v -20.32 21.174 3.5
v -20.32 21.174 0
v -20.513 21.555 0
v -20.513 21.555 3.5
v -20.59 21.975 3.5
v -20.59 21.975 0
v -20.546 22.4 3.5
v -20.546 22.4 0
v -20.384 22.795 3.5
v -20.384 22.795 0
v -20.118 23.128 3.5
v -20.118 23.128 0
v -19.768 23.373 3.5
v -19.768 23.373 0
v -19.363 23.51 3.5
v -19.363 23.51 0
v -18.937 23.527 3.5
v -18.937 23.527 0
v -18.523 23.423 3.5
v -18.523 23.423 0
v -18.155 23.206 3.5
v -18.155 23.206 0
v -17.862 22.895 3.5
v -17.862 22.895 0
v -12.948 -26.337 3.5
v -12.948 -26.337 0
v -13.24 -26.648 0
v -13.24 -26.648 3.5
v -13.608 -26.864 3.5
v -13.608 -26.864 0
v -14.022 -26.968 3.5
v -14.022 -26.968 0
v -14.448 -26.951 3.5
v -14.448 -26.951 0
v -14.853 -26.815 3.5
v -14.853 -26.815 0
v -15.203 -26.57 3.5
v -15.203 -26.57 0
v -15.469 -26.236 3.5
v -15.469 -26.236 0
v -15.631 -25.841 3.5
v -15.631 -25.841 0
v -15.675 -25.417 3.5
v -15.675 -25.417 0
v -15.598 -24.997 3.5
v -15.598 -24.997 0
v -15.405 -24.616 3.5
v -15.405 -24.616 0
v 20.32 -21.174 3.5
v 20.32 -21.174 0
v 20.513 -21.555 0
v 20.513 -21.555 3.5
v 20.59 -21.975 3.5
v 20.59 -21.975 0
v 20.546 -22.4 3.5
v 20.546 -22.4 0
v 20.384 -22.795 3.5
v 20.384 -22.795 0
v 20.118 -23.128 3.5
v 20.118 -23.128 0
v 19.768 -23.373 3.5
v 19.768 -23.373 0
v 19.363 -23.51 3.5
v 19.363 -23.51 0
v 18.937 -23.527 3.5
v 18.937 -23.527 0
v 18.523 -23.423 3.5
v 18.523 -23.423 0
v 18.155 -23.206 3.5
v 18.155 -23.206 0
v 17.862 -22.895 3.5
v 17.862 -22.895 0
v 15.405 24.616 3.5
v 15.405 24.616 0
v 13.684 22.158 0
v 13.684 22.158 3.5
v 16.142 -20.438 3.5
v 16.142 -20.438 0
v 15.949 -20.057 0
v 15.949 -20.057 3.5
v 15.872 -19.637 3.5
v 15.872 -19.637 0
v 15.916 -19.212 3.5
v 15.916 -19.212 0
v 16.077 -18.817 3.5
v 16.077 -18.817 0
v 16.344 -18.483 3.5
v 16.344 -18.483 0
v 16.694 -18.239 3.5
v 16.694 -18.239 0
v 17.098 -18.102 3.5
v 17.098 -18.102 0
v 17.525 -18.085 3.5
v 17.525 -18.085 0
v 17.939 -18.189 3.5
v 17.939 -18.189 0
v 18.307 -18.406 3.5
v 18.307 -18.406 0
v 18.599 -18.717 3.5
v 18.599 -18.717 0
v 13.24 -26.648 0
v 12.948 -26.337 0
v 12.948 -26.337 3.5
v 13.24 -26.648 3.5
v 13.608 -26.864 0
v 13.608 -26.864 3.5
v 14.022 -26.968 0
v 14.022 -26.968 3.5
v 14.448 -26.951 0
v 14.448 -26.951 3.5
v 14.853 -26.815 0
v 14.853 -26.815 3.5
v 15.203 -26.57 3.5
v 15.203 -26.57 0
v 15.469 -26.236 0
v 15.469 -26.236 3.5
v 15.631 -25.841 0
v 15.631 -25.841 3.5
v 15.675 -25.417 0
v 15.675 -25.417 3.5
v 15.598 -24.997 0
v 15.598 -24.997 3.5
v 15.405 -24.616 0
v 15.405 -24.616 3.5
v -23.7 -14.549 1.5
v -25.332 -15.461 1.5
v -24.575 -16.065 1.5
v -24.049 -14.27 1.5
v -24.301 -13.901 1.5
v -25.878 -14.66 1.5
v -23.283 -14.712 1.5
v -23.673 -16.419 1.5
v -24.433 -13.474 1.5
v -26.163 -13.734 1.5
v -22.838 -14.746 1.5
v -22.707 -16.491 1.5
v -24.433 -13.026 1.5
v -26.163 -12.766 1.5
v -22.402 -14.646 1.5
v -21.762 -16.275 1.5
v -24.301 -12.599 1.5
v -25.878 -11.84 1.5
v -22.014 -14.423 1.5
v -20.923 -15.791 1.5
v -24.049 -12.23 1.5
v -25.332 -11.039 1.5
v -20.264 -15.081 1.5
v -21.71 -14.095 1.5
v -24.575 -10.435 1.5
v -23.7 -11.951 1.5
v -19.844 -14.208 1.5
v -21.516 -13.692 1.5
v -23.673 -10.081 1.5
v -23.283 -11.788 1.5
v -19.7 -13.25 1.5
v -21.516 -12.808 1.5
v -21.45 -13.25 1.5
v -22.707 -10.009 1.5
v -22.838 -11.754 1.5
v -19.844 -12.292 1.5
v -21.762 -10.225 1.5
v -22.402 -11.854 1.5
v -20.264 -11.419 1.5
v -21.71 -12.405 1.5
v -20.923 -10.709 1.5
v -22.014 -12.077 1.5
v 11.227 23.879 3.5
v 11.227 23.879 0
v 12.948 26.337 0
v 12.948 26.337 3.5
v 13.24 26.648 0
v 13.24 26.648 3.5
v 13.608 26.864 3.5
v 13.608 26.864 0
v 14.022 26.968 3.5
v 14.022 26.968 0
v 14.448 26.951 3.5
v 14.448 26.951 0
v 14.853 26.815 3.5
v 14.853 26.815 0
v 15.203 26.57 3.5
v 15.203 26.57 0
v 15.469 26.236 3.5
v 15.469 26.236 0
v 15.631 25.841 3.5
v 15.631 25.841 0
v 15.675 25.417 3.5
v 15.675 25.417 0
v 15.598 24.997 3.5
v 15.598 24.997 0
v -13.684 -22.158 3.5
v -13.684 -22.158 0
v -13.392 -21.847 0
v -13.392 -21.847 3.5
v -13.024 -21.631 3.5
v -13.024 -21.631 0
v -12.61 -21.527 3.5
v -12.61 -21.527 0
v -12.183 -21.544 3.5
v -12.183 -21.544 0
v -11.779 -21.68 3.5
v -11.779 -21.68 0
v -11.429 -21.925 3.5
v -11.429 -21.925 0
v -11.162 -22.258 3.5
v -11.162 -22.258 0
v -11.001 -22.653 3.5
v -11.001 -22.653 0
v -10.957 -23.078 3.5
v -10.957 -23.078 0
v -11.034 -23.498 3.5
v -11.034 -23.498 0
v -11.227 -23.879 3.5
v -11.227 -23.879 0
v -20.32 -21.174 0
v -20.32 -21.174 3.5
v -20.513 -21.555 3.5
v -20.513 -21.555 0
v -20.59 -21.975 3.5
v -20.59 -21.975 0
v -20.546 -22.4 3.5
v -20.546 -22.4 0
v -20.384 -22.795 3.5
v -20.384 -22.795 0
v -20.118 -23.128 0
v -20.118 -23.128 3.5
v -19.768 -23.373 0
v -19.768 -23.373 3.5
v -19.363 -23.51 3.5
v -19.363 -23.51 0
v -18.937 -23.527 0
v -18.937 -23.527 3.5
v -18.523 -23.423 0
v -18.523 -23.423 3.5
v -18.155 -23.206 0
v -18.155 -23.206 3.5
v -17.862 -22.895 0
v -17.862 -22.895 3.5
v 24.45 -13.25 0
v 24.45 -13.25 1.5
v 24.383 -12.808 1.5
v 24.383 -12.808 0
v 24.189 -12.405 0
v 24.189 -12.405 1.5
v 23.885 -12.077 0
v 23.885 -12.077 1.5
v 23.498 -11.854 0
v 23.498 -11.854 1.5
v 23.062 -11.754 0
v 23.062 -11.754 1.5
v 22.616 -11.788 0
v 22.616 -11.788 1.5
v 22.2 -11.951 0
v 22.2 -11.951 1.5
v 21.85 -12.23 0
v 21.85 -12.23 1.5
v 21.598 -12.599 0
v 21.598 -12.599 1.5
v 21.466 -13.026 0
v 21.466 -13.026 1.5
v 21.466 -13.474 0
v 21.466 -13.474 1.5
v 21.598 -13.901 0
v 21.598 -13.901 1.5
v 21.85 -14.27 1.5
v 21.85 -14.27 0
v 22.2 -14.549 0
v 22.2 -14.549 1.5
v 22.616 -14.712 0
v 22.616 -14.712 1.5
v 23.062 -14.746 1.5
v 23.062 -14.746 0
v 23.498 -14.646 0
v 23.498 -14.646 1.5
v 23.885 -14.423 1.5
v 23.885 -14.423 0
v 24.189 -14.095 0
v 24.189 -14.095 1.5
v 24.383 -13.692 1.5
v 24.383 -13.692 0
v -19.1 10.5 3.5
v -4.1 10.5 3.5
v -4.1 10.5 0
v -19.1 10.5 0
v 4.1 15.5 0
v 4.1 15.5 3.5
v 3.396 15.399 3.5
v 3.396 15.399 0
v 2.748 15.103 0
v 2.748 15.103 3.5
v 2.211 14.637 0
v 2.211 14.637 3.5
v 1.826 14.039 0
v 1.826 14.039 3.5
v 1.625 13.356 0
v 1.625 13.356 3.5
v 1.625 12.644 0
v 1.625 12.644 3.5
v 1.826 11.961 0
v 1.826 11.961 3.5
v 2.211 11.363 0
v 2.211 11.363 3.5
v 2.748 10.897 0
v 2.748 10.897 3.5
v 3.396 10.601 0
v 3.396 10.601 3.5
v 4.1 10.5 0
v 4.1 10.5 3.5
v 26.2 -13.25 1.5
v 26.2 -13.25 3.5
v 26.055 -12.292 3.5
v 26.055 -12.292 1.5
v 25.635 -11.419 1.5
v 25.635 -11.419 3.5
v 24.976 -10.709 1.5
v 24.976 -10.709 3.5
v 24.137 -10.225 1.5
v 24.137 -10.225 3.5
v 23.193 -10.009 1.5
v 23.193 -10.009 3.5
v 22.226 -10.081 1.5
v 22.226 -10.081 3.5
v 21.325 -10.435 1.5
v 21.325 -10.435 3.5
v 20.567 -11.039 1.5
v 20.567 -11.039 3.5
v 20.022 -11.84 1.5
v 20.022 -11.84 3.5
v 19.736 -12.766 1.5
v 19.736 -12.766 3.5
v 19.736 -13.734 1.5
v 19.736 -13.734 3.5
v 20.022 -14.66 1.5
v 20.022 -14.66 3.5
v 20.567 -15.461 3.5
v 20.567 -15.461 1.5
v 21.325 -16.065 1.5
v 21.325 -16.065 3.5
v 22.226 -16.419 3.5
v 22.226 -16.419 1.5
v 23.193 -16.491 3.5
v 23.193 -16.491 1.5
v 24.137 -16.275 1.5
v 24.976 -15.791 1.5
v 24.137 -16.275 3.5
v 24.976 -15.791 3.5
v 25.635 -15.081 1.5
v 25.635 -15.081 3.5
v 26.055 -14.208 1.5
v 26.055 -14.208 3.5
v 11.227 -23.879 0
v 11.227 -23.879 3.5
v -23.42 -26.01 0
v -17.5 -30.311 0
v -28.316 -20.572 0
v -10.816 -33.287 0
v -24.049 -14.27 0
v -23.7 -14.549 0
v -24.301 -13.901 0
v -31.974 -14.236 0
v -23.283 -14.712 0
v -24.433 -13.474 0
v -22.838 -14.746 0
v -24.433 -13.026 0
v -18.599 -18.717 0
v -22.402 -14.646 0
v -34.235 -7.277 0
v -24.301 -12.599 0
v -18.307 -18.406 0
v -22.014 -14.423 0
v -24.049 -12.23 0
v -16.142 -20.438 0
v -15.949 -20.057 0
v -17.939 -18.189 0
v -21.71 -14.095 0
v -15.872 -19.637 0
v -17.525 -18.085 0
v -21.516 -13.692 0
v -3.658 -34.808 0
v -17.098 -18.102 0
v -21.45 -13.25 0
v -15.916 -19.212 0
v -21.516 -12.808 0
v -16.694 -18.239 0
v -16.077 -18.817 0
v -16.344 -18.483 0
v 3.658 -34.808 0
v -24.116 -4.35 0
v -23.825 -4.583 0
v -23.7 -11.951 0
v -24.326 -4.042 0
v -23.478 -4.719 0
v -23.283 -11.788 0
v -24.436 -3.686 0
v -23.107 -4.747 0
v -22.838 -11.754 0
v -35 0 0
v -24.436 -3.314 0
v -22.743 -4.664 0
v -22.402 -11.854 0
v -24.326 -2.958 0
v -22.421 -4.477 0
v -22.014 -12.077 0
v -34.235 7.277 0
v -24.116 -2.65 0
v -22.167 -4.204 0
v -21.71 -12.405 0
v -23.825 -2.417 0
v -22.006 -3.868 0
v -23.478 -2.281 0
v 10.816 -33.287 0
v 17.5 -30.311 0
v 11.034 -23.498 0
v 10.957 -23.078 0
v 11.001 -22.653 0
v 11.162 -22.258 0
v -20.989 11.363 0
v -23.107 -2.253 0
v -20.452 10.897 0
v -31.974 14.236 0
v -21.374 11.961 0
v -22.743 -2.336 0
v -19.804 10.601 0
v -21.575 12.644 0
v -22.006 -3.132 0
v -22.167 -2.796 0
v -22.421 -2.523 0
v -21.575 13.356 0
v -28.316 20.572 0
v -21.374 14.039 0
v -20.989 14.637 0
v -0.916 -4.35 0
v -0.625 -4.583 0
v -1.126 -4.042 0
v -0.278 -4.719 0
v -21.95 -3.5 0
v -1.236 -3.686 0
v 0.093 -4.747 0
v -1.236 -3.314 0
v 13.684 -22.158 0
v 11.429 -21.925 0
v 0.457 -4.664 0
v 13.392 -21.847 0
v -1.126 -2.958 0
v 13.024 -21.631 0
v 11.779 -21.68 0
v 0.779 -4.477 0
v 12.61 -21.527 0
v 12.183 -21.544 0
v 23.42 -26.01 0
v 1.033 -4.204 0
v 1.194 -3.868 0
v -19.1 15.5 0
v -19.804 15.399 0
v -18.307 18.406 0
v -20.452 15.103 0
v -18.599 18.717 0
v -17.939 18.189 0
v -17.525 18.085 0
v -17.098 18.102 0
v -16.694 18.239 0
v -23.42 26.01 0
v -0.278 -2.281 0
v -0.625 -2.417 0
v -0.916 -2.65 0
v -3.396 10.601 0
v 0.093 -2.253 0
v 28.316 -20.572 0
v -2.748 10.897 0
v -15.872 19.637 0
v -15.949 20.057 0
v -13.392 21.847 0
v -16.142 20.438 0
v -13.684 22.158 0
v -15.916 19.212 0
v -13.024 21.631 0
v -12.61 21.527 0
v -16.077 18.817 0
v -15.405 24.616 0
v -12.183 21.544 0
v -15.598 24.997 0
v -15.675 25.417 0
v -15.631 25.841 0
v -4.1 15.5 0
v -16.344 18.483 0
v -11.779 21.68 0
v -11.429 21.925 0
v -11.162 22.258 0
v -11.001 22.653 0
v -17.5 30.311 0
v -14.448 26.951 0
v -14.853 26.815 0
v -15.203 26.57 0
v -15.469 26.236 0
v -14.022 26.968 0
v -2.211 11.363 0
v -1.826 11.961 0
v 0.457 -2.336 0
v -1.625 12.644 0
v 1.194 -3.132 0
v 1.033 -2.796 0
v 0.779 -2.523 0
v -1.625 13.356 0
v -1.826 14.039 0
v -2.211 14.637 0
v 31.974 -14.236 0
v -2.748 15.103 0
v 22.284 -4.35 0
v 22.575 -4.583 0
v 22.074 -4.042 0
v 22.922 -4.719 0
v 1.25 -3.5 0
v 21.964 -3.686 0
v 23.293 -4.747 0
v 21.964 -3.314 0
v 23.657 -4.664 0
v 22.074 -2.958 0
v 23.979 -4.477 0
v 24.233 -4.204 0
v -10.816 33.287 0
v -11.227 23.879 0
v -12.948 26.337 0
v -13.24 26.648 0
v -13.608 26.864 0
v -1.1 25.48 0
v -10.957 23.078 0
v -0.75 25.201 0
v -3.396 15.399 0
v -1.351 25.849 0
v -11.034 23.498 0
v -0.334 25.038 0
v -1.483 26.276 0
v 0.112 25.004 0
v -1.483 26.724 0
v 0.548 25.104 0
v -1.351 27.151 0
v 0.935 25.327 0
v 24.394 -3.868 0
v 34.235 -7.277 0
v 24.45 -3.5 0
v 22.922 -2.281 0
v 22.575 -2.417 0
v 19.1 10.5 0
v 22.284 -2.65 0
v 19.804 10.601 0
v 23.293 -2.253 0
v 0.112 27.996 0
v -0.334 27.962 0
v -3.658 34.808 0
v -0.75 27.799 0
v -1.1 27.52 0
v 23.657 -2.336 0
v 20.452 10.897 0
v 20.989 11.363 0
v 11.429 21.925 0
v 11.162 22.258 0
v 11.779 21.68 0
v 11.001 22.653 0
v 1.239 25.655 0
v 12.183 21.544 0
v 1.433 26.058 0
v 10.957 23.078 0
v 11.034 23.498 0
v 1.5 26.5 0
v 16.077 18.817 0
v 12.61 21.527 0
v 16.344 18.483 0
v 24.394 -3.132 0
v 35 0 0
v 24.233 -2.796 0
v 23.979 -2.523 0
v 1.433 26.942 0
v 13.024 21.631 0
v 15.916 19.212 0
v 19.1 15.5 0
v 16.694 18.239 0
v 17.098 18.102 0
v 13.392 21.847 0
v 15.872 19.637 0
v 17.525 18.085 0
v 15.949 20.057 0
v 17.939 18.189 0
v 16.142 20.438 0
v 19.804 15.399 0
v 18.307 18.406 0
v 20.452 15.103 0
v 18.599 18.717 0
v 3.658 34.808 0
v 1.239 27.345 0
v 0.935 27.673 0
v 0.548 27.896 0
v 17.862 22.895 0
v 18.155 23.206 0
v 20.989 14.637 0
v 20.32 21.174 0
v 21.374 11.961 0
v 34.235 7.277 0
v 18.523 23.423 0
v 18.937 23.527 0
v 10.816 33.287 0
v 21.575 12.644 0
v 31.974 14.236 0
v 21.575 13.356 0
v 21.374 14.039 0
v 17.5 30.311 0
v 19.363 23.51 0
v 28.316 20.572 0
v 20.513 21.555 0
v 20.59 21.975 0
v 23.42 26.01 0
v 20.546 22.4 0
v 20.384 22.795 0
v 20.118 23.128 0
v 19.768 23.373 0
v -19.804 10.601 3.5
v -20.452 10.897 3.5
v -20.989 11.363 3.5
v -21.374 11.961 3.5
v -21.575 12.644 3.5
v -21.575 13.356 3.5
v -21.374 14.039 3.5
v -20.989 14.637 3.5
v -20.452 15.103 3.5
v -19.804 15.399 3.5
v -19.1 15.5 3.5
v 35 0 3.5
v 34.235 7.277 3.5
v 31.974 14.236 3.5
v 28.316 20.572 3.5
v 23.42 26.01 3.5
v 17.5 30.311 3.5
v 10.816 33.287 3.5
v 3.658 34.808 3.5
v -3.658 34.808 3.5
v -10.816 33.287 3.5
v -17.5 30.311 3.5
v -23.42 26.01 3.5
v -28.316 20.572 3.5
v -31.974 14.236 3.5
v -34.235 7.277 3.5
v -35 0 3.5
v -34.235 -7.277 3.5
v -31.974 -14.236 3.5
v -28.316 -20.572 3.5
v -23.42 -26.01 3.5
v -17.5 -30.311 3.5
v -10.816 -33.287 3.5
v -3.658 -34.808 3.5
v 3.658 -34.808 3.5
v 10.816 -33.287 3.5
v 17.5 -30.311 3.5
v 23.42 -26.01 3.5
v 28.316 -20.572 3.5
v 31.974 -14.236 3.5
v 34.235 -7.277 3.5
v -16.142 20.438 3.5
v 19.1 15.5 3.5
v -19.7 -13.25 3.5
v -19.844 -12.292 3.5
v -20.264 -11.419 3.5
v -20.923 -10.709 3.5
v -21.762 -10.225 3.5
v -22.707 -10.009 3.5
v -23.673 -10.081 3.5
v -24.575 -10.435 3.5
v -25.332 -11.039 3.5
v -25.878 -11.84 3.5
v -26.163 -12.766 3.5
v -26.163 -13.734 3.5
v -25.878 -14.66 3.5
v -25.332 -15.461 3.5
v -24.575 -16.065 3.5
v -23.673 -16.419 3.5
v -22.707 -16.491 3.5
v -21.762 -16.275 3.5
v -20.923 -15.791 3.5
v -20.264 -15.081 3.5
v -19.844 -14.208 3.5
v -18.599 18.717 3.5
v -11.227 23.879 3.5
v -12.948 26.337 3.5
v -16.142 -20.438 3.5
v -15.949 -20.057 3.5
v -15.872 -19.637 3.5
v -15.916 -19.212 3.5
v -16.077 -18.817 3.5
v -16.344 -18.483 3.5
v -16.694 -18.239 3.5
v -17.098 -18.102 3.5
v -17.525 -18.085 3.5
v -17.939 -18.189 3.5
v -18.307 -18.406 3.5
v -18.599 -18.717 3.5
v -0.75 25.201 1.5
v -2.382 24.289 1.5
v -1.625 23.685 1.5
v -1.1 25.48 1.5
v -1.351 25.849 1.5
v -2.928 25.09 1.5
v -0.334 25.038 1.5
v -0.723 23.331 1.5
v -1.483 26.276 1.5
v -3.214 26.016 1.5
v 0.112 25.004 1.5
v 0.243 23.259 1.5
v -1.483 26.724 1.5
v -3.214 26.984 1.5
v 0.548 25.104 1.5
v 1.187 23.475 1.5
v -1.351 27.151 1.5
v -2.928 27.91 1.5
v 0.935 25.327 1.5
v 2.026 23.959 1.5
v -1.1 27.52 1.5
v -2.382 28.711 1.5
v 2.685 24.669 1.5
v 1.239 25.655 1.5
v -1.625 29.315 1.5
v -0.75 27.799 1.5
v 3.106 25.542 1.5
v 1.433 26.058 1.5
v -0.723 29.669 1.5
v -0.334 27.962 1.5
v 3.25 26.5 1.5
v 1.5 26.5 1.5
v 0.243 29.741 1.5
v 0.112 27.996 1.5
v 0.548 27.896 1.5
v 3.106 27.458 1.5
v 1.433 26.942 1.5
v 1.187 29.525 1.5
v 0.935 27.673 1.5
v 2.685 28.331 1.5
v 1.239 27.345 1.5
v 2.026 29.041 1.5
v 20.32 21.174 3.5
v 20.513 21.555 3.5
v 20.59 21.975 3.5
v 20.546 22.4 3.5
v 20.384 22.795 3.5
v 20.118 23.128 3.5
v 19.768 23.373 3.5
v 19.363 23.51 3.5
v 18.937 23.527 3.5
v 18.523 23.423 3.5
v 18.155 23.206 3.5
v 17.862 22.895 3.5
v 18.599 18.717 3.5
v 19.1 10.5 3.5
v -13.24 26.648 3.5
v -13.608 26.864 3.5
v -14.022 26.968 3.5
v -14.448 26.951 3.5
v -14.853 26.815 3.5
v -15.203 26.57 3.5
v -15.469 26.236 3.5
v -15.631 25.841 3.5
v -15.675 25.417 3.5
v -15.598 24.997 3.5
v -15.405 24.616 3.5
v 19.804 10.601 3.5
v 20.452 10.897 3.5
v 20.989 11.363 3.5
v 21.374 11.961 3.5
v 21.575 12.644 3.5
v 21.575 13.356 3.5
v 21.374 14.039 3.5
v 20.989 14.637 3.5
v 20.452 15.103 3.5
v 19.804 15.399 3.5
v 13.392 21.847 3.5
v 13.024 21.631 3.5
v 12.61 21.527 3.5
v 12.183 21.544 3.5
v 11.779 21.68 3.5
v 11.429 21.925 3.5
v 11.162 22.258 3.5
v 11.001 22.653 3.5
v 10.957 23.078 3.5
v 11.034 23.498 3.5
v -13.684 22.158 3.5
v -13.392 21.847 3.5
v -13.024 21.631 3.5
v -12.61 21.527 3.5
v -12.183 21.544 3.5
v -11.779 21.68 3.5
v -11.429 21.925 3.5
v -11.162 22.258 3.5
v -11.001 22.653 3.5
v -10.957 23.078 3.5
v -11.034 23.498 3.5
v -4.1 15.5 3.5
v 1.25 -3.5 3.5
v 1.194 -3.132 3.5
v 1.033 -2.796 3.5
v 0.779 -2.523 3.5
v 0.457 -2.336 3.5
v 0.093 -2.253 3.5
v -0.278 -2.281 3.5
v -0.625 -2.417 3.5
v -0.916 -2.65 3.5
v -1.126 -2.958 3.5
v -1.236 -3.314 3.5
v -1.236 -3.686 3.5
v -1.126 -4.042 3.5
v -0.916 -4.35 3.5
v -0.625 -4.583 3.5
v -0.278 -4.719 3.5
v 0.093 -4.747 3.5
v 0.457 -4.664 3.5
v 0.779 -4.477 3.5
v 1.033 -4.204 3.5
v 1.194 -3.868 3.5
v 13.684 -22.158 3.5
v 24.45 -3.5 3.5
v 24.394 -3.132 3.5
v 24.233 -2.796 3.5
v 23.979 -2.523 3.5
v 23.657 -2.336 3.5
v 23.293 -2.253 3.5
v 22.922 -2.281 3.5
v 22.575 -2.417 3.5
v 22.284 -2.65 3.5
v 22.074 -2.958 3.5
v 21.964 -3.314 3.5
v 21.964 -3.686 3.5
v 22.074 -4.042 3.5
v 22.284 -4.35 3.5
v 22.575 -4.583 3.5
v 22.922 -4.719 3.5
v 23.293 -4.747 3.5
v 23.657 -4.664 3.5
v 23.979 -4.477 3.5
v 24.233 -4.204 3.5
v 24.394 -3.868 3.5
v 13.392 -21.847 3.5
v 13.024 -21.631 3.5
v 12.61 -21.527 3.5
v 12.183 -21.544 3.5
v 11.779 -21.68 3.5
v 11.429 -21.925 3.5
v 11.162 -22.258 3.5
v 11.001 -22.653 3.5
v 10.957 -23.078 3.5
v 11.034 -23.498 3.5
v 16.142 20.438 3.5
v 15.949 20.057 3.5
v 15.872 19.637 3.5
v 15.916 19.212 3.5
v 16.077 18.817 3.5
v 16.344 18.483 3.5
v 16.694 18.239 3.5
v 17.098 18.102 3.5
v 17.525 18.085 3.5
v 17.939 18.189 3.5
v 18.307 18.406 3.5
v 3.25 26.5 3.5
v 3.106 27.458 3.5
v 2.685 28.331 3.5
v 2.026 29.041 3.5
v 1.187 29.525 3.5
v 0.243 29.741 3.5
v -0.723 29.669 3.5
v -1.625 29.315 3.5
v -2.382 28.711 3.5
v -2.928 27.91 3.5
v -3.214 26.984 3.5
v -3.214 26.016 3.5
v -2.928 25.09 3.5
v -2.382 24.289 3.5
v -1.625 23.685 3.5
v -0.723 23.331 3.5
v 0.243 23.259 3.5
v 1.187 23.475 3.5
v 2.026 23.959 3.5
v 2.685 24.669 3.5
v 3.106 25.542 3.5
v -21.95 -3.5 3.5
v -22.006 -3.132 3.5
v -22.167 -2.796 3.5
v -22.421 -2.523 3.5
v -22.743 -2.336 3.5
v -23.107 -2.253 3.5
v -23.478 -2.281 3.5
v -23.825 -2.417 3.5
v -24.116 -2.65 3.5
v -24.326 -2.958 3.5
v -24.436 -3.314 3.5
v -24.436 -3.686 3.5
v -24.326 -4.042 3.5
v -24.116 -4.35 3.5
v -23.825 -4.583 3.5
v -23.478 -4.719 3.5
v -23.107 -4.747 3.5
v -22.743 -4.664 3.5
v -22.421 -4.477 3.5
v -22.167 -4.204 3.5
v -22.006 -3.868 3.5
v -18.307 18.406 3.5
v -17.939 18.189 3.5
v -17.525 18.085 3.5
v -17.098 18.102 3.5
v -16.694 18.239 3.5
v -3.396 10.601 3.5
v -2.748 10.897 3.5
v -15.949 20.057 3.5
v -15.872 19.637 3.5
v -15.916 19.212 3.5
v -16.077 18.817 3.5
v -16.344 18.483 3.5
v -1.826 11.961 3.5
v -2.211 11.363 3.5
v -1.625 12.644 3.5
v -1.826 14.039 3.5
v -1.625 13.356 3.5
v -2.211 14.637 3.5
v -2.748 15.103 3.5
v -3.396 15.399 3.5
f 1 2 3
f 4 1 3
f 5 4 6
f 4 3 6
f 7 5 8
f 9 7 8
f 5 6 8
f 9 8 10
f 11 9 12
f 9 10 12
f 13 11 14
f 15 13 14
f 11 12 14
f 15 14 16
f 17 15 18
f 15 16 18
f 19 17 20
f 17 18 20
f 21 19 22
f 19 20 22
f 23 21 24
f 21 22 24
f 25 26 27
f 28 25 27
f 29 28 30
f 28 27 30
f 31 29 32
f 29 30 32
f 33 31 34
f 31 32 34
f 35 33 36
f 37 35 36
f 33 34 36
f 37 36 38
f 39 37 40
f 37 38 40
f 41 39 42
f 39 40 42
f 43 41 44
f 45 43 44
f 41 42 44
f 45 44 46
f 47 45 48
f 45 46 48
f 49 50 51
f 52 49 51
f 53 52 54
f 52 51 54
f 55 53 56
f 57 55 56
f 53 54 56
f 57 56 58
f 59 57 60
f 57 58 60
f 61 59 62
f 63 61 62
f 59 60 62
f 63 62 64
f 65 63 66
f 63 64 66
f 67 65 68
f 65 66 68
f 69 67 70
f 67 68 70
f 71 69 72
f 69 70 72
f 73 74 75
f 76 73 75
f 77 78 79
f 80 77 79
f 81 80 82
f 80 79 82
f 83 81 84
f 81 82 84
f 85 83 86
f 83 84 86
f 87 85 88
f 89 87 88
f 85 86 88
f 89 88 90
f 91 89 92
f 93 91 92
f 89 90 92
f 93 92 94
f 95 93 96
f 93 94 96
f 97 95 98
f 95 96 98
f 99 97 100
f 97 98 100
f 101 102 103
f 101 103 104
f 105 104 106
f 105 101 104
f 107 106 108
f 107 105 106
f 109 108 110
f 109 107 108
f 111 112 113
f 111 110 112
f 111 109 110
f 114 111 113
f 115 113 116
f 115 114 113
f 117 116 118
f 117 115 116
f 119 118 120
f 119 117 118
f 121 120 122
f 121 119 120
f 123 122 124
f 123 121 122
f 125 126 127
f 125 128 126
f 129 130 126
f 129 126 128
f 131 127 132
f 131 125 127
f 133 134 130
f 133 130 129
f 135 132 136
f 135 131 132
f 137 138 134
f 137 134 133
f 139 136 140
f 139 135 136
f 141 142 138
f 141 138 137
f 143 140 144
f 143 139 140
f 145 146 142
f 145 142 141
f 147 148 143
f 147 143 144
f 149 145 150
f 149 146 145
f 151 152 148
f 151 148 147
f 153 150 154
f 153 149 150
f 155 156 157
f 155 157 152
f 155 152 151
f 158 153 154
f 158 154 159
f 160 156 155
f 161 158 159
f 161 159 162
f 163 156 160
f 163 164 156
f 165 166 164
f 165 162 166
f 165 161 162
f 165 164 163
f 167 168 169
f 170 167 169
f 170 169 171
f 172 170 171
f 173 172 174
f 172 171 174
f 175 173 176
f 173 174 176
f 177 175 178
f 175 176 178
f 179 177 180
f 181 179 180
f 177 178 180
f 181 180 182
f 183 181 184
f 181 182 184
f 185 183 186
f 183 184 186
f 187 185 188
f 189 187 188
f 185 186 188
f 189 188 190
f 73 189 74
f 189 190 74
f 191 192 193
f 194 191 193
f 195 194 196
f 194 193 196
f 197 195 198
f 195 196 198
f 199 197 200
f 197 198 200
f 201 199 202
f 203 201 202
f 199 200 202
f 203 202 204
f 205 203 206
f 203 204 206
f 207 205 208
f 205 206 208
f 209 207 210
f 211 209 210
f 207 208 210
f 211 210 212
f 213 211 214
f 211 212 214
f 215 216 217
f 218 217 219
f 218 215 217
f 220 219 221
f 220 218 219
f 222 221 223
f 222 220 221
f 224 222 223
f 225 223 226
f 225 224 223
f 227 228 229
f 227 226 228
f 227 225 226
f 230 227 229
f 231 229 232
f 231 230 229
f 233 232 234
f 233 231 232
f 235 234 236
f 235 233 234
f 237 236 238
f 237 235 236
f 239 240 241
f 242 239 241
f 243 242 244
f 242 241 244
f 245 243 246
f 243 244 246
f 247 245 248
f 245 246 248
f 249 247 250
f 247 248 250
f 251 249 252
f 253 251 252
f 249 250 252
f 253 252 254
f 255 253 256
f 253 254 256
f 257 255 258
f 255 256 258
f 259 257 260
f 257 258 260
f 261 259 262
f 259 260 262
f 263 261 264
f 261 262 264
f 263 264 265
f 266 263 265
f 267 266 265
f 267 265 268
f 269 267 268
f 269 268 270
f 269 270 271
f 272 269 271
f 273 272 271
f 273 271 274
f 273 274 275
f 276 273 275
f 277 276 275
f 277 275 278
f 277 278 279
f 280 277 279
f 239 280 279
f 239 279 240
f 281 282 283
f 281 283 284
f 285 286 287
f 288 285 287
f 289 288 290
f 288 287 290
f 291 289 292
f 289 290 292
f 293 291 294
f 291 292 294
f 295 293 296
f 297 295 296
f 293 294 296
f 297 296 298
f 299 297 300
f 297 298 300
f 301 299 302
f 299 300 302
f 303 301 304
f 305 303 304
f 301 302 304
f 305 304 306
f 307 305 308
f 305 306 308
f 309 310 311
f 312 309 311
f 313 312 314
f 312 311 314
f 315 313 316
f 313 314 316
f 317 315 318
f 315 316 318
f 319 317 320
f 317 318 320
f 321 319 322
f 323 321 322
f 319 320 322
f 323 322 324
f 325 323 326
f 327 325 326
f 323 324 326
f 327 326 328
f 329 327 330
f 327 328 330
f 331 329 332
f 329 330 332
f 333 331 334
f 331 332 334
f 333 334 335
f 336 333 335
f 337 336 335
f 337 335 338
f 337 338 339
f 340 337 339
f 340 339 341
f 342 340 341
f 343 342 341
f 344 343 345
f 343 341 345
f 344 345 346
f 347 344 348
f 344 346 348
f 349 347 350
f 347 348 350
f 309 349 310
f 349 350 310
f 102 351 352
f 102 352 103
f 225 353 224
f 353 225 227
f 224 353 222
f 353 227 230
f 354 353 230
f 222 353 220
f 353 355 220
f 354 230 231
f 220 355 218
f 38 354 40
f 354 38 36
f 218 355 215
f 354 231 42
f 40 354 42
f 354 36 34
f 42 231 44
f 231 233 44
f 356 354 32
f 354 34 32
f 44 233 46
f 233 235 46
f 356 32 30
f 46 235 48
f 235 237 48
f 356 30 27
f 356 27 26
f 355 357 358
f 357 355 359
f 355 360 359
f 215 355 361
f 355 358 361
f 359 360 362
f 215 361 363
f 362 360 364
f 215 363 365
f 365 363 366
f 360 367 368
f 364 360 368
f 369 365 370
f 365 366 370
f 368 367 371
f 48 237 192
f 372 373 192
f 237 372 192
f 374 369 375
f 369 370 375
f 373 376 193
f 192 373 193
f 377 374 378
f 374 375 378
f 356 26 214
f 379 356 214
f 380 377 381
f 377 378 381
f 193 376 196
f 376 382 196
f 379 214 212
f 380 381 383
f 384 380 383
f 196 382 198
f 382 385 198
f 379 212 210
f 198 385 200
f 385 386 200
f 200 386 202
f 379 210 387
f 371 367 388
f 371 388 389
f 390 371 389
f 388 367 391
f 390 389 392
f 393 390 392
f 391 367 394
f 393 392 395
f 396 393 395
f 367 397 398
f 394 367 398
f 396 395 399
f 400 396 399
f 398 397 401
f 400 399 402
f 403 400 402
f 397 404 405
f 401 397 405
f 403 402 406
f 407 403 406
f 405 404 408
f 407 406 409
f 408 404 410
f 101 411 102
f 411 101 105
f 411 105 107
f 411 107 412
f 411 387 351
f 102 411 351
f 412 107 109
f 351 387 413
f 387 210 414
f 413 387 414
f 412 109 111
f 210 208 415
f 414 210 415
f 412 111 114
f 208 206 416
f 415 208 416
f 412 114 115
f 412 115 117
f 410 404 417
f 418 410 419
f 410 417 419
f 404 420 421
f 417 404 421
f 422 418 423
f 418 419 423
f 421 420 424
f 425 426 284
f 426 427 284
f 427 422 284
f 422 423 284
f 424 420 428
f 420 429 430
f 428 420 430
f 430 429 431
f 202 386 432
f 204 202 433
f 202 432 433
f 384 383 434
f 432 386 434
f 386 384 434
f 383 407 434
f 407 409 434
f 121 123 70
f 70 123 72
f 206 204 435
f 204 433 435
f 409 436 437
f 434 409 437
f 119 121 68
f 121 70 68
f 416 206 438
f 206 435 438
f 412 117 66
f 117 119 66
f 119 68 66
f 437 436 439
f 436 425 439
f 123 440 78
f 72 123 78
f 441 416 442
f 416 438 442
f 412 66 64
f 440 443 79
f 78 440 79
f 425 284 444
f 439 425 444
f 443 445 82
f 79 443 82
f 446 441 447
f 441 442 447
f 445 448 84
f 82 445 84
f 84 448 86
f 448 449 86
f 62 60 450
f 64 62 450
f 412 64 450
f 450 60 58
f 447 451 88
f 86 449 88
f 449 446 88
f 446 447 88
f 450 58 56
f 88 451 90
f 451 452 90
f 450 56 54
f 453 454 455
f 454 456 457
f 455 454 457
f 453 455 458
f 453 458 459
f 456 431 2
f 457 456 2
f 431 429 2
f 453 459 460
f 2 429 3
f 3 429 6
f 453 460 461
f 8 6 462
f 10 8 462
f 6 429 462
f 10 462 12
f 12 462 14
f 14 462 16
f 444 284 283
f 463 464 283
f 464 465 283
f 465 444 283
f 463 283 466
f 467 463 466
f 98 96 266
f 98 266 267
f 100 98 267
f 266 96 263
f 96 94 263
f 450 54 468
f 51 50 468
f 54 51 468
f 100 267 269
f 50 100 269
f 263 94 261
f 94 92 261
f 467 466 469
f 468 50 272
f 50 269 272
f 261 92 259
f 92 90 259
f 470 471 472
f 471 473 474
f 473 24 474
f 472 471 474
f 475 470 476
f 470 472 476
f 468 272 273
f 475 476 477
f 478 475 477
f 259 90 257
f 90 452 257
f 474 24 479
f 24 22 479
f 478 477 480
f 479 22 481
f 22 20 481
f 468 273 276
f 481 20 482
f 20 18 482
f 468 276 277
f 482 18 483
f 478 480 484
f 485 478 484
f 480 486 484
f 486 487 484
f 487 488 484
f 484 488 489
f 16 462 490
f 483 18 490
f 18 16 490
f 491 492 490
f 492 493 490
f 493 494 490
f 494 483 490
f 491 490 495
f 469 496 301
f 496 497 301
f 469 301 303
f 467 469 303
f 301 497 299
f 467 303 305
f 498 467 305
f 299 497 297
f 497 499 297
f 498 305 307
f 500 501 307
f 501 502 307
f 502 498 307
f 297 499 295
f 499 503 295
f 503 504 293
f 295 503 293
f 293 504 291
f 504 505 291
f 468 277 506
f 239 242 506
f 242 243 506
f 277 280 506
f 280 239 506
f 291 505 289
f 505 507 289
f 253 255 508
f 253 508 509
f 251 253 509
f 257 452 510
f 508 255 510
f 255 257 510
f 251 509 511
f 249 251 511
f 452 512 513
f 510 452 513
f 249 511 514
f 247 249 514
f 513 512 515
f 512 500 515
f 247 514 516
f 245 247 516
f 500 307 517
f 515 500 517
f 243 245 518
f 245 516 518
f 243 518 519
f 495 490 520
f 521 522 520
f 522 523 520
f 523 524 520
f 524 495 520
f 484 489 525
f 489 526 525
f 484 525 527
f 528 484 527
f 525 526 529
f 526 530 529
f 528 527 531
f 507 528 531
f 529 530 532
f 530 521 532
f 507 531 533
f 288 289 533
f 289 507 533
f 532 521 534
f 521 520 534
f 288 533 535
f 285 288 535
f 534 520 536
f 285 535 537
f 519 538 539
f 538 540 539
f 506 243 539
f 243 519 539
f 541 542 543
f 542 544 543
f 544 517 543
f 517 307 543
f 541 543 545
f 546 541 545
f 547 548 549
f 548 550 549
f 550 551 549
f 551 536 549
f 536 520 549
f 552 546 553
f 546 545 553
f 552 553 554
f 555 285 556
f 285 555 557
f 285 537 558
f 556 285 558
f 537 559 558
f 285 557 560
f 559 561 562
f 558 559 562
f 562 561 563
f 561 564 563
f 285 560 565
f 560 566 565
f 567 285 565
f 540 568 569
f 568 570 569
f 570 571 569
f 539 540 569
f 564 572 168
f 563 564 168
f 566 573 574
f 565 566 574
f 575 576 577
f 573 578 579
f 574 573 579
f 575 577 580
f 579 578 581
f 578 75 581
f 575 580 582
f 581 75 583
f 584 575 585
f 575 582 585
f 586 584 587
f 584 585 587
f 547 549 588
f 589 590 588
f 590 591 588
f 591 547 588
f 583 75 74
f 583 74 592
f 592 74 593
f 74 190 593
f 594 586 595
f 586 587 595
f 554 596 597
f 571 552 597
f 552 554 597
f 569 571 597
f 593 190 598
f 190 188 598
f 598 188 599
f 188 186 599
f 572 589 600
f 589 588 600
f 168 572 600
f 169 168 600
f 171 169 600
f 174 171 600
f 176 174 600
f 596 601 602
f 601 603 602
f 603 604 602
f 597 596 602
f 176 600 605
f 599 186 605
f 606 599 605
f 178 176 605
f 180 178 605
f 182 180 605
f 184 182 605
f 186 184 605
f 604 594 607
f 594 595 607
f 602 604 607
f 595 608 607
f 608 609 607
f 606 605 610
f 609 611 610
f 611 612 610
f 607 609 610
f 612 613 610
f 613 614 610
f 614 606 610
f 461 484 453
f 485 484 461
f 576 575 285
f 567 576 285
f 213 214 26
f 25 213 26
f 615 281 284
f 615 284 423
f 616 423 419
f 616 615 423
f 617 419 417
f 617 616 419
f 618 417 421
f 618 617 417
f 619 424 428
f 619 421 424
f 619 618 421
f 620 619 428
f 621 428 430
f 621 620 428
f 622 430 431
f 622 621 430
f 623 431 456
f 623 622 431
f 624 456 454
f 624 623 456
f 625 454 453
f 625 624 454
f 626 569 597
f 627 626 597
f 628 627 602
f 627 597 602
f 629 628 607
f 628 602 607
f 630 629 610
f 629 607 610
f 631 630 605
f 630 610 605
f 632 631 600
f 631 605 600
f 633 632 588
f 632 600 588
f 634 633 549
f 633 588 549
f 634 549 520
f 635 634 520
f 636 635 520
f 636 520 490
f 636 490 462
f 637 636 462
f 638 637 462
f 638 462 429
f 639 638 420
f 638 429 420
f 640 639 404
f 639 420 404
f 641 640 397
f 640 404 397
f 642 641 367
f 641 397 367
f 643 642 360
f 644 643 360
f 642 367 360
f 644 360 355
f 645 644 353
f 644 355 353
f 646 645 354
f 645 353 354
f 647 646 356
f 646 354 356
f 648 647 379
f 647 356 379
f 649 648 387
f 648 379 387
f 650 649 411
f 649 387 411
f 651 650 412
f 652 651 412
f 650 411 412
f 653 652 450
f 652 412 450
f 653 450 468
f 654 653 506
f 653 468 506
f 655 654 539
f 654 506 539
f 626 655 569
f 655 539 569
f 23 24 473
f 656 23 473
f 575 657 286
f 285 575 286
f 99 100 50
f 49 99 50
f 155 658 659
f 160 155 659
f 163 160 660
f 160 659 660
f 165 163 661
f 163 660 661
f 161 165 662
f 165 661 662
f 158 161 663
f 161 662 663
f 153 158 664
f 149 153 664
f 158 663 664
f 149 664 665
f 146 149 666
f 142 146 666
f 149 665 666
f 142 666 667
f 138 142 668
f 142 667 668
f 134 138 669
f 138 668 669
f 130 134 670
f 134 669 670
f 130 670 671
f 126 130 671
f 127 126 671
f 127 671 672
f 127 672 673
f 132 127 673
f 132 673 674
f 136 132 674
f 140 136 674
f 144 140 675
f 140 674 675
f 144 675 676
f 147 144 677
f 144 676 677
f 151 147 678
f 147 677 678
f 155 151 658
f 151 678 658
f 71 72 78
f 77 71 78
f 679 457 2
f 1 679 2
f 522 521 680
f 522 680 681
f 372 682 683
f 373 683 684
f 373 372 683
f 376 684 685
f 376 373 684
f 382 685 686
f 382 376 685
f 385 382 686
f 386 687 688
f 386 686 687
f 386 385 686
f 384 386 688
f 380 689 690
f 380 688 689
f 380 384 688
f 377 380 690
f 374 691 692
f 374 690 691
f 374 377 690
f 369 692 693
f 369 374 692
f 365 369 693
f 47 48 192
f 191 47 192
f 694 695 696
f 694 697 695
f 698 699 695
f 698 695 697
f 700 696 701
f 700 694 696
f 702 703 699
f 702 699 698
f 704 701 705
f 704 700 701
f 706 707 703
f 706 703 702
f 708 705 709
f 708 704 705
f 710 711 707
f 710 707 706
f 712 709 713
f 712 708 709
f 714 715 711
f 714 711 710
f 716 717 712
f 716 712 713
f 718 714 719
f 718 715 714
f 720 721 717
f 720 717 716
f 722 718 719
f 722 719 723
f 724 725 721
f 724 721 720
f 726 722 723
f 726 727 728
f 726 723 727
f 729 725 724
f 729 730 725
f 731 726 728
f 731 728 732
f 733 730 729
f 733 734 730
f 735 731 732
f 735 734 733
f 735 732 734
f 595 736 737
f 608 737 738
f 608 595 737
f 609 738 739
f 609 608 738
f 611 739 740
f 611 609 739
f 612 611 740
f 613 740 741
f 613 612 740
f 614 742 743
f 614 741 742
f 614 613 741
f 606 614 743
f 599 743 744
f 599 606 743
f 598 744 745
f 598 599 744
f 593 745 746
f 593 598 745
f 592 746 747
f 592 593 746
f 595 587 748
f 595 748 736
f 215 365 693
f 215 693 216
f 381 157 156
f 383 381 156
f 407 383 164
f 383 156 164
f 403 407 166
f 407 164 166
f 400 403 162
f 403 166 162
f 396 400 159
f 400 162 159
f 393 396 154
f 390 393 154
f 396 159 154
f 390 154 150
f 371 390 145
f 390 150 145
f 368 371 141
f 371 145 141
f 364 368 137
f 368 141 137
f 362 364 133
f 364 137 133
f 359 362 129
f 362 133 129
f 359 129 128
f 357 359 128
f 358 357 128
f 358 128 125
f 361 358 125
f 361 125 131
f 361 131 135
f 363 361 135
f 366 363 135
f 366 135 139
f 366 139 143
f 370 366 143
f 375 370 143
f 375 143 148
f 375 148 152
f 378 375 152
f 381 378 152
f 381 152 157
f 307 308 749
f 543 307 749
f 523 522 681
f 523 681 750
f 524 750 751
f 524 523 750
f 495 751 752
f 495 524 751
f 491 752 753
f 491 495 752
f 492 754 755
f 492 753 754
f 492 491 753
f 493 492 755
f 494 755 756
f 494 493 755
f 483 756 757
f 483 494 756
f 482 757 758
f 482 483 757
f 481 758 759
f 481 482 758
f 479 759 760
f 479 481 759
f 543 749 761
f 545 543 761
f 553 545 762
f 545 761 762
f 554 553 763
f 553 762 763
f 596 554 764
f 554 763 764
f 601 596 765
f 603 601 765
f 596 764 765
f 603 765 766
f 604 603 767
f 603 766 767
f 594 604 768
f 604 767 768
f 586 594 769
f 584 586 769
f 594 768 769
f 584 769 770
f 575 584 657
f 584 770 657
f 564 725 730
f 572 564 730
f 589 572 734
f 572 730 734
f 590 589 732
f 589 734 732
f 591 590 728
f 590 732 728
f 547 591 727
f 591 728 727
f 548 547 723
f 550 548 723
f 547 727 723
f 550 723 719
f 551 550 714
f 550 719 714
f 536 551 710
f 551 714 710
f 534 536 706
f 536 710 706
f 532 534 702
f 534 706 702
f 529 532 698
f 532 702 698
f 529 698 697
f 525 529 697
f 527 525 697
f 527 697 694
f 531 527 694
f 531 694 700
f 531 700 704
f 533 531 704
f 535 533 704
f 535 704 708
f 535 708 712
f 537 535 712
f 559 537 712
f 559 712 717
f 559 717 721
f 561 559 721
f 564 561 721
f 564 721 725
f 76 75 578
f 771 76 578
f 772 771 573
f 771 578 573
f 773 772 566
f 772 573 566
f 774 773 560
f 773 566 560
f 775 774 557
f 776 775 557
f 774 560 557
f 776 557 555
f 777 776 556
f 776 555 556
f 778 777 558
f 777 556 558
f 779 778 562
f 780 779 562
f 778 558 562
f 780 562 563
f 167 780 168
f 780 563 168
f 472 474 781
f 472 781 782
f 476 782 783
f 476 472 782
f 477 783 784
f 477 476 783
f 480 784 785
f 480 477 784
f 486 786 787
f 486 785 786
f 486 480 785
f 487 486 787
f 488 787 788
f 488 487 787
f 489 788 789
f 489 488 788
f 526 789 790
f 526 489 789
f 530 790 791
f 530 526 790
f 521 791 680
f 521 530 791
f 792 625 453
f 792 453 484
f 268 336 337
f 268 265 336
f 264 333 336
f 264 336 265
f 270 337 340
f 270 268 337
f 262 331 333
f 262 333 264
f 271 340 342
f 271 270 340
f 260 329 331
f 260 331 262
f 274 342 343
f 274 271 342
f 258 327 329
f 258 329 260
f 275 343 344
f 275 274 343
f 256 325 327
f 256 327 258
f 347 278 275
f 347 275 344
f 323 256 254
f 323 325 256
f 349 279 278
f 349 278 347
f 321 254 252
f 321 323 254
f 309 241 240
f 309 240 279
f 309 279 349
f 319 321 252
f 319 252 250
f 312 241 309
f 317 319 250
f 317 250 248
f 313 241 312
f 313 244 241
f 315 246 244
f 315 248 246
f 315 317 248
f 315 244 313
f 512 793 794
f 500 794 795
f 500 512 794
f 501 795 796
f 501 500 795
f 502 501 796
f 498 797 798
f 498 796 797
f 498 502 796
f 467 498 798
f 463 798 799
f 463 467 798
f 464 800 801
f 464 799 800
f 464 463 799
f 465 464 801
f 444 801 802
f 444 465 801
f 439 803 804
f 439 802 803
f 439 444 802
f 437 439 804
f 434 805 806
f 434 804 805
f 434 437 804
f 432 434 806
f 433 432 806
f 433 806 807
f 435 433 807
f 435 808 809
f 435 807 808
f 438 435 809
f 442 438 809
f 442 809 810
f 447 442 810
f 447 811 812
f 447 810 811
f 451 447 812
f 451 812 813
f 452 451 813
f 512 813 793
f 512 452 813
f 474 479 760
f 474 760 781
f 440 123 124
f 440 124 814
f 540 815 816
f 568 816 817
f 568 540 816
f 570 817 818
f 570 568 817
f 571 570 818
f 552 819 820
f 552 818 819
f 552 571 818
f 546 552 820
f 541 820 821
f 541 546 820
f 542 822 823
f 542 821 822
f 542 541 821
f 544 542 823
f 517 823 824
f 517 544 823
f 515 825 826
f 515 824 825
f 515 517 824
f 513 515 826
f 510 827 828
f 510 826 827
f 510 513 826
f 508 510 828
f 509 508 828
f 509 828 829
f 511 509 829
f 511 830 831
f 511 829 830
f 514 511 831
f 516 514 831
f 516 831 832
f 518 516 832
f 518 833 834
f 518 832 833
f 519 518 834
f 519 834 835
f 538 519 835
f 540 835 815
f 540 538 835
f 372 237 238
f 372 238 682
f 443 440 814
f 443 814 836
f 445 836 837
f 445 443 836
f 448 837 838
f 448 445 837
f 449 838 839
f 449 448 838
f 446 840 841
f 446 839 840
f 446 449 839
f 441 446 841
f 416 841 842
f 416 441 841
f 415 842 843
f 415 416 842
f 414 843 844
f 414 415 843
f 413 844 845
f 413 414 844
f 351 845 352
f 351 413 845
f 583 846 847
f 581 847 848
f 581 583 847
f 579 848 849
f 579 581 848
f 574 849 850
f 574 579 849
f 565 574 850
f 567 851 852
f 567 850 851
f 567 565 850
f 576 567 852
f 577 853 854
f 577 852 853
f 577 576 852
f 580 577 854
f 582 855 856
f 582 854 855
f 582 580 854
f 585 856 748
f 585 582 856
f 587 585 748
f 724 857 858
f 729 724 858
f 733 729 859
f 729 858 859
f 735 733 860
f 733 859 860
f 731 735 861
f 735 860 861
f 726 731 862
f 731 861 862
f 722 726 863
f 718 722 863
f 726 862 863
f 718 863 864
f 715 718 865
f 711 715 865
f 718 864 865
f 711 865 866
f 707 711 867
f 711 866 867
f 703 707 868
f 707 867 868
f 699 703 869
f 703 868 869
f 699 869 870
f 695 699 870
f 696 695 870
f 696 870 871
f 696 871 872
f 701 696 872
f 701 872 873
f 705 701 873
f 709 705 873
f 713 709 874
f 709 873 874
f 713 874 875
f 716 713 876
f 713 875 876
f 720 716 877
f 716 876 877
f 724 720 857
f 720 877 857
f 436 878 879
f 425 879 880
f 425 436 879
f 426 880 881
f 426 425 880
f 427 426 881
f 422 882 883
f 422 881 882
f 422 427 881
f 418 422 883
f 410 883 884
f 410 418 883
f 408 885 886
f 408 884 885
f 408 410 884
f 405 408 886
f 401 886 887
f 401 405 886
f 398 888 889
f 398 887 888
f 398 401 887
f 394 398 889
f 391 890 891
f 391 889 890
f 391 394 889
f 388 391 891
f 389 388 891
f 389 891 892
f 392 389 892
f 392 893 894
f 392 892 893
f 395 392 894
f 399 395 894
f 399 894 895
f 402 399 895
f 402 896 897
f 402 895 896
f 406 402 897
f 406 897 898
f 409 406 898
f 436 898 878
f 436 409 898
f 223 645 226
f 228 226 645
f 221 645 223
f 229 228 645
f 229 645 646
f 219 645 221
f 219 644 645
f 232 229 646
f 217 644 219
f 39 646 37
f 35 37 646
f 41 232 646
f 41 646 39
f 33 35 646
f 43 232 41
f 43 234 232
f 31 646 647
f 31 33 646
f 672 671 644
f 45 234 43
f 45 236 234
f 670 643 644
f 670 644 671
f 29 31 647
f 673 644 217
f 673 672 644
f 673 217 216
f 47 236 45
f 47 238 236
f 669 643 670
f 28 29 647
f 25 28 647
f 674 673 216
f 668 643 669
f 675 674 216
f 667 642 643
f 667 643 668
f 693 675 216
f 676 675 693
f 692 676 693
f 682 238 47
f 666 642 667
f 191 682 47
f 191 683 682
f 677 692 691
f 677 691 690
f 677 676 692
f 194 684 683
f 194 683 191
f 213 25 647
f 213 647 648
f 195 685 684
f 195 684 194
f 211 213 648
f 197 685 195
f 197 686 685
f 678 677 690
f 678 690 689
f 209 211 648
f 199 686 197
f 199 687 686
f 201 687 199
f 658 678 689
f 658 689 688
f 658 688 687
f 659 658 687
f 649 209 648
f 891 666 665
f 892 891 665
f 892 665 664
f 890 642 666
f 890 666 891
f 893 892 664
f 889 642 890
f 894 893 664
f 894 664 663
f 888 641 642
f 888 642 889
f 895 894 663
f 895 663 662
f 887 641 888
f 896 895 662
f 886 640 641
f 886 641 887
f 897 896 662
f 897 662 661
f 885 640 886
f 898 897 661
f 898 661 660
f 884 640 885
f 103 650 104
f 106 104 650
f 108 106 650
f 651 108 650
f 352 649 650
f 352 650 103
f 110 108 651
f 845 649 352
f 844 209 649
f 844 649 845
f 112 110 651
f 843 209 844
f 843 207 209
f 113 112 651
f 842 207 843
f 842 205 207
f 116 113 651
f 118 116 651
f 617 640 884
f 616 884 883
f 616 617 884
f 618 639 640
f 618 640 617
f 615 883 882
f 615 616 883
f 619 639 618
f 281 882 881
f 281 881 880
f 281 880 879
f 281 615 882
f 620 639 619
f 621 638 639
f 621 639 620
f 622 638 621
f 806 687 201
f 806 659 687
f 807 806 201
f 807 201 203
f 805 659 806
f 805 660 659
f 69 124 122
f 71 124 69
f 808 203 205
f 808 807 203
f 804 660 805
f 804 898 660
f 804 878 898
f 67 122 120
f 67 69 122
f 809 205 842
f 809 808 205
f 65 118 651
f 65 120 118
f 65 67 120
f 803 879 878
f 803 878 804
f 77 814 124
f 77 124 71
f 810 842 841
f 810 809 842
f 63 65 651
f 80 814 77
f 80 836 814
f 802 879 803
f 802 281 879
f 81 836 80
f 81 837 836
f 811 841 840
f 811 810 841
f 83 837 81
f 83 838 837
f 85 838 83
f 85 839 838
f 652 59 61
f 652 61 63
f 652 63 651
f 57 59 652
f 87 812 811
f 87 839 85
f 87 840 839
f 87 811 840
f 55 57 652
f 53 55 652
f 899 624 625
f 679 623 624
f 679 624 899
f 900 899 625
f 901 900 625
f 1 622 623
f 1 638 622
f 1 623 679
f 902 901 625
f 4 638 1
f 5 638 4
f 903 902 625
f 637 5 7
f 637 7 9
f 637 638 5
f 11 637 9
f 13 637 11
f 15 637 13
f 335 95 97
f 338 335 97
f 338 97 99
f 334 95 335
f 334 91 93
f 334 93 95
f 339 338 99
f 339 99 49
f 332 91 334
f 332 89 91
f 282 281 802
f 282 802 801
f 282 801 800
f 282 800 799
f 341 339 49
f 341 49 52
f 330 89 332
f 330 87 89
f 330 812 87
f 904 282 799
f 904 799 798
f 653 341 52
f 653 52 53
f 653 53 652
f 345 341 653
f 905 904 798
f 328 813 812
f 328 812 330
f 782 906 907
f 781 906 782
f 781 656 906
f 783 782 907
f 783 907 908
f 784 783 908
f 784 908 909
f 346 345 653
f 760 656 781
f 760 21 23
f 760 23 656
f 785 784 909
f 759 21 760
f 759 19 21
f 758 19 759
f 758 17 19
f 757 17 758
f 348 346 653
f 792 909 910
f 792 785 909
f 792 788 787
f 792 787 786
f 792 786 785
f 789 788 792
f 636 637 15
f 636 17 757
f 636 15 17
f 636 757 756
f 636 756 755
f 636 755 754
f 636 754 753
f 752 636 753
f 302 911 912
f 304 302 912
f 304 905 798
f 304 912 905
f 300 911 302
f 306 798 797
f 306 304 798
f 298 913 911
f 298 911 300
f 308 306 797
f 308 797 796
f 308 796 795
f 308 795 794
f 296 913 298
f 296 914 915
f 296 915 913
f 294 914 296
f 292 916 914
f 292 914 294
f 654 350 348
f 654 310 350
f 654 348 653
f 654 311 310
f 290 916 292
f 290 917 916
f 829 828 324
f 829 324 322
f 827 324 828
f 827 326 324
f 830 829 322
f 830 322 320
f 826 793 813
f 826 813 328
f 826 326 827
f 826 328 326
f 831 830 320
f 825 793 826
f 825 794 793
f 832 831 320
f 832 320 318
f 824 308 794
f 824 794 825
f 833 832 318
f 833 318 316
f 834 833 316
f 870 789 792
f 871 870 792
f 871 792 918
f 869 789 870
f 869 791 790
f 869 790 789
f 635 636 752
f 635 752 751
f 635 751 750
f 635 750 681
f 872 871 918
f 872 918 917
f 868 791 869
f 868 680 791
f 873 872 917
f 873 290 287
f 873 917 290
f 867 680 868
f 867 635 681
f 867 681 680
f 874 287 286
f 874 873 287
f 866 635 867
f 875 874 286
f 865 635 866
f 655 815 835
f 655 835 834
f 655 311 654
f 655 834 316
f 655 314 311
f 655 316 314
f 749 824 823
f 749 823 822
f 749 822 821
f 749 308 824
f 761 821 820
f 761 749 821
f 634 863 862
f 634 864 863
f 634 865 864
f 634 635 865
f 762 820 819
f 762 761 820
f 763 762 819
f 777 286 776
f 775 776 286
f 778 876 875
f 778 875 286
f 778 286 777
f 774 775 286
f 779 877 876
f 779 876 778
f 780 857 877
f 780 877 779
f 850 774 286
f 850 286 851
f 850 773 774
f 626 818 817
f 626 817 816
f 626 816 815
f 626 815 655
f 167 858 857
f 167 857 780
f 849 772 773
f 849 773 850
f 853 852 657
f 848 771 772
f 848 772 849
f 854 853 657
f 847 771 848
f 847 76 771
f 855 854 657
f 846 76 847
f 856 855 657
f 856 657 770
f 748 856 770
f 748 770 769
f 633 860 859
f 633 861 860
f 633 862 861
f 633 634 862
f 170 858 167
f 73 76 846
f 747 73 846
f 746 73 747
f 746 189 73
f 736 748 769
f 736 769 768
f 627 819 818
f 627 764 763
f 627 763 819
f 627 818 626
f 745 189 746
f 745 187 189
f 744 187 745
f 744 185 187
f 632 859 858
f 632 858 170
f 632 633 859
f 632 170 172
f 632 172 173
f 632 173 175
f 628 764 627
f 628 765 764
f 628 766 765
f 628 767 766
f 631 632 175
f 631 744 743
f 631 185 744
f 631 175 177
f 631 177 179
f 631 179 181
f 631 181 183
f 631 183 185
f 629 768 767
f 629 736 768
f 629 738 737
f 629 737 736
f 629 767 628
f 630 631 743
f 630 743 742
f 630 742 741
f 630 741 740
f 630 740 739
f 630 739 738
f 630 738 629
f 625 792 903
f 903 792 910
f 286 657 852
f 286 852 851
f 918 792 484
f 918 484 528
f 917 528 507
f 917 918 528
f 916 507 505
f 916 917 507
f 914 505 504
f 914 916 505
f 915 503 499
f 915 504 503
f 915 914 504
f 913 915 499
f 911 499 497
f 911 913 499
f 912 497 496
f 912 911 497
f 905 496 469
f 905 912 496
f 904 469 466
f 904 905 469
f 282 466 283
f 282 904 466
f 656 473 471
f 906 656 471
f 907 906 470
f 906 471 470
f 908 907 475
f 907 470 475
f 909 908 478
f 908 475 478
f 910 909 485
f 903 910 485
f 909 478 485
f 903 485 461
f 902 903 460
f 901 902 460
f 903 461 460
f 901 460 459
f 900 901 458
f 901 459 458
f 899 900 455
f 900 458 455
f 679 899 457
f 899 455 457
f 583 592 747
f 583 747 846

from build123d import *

# Parameters (mm, degrees)
CROQUIS2_R              = 35
SALIENTE_EXTRUIR1_DEPTH = 3.5
CORTAR_EXTRUIR3_DEPTH   = 50.621064076
CORTAR_EXTRUIR4_START   = -3.5
CROQUIS4_R              = 1.25
CORTAR_EXTRUIR4_DEPTH   = 54.121064076
CROQUIS6_R              = 3.25
CORTAR_EXTRUIR6_DEPTH   = 2
CROQUIS7_R              = 1.5
CORTAR_EXTRUIR7_DEPTH   = 50.621064076
CORTAR_EXTRUIR9_DEPTH   = 50.621064076


with BuildPart() as part:
    # Croquis2 → Saliente-Extruir1 (new body)
    with BuildSketch(Plane.XY):
        Circle(CROQUIS2_R)
    extrude(amount=SALIENTE_EXTRUIR1_DEPTH)

    # Croquis3 → Cortar-Extruir3 (cut, through all)
    with BuildSketch(Plane.XY):
        with BuildLine():
            Line((11.226803146, 23.879047115), (12.947532455, 26.336503248))
            ThreePointArc((12.947532455, 26.336503248), (15.036625176, 26.70486666), (15.404988588, 24.615773939))
            Line((15.404988588, 24.615773939), (13.684259279, 22.158317806))
            ThreePointArc((13.684259279, 22.158317806), (11.595166558, 21.789954394), (11.226803146, 23.879047115))
        make_face()
        with BuildLine():
            Line((18.599171544, 18.716859188), (20.319900853, 21.174315321))
            ThreePointArc((20.319900853, 21.174315321), (19.951537442, 23.263408042), (17.862444721, 22.89504463))
            Line((17.862444721, 22.89504463), (16.141715412, 20.437588497))
            ThreePointArc((16.141715412, 20.437588497), (16.510078823, 18.348495776), (18.599171544, 18.716859188))
        make_face()
        with BuildLine():
            Line((18.599171544, -18.716859188), (20.319900853, -21.174315321))
            ThreePointArc((20.319900853, -21.174315321), (19.951537442, -23.263408042), (17.862444721, -22.89504463))
            Line((17.862444721, -22.89504463), (16.141715412, -20.437588497))
            ThreePointArc((16.141715412, -20.437588497), (16.510078823, -18.348495776), (18.599171544, -18.716859188))
        make_face()
        with BuildLine():
            Line((11.226803146, -23.879047115), (12.947532455, -26.336503248))
            ThreePointArc((12.947532455, -26.336503248), (15.036625176, -26.70486666), (15.404988588, -24.615773939))
            Line((15.404988588, -24.615773939), (13.684259279, -22.158317806))
            ThreePointArc((13.684259279, -22.158317806), (11.595166558, -21.789954394), (11.226803146, -23.879047115))
        make_face()
        with BuildLine():
            Line((-11.226803146, -23.879047115), (-12.947532455, -26.336503248))
            ThreePointArc((-12.947532455, -26.336503248), (-15.036625176, -26.70486666), (-15.404988588, -24.615773939))
            Line((-15.404988588, -24.615773939), (-13.684259279, -22.158317806))
            ThreePointArc((-13.684259279, -22.158317806), (-11.595166558, -21.789954394), (-11.226803146, -23.879047115))
        make_face()
        with BuildLine():
            Line((-18.599171544, -18.716859188), (-20.319900853, -21.174315321))
            ThreePointArc((-20.319900853, -21.174315321), (-19.951537442, -23.263408042), (-17.862444721, -22.89504463))
            Line((-17.862444721, -22.89504463), (-16.141715412, -20.437588497))
            ThreePointArc((-16.141715412, -20.437588497), (-16.510078823, -18.348495776), (-18.599171544, -18.716859188))
        make_face()
        with BuildLine():
            Line((-18.599171544, 18.716859188), (-20.319900853, 21.174315321))
            ThreePointArc((-20.319900853, 21.174315321), (-19.951537442, 23.263408042), (-17.862444721, 22.89504463))
            Line((-17.862444721, 22.89504463), (-16.141715412, 20.437588497))
            ThreePointArc((-16.141715412, 20.437588497), (-16.510078823, 18.348495776), (-18.599171544, 18.716859188))
        make_face()
        with BuildLine():
            Line((-11.226803146, 23.879047115), (-12.947532455, 26.336503248))
            ThreePointArc((-12.947532455, 26.336503248), (-15.036625176, 26.70486666), (-15.404988588, 24.615773939))
            Line((-15.404988588, 24.615773939), (-13.684259279, 22.158317806))
            ThreePointArc((-13.684259279, 22.158317806), (-11.595166558, 21.789954394), (-11.226803146, 23.879047115))
        make_face()
    extrude(amount=CORTAR_EXTRUIR3_DEPTH, mode=Mode.SUBTRACT)

    # Croquis4 → Cortar-Extruir4 (cut, through all)
    with BuildSketch(Plane.XY.offset(3.5).offset(CORTAR_EXTRUIR4_START)):
        with Locations((-23.2, -3.5)):
            Circle(CROQUIS4_R)
        with Locations((23.2, -3.5)):
            Circle(CROQUIS4_R)
        with Locations((0, -3.5)):
            Circle(CROQUIS4_R)
    extrude(amount=CORTAR_EXTRUIR4_DEPTH, mode=Mode.SUBTRACT)

    # Croquis6 → Cortar-Extruir6 (cut)
    with BuildSketch(Plane.XY.offset(3.5)):
        with Locations((0, 26.5)):
            Circle(CROQUIS6_R)
        with Locations((22.9496732, -13.25)):
            Circle(CROQUIS6_R)
        with Locations((-22.9496732, -13.25)):
            Circle(CROQUIS6_R)
    extrude(amount=-CORTAR_EXTRUIR6_DEPTH, mode=Mode.SUBTRACT)

    # Croquis7 → Cortar-Extruir7 (cut, through all)
    with BuildSketch(Plane.XY.offset(3.5)):
        with Locations((0, 26.5)):
            Circle(CROQUIS7_R)
        with Locations((22.9496732, -13.25)):
            Circle(CROQUIS7_R)
        with Locations((-22.9496732, -13.25)):
            Circle(CROQUIS7_R)
    extrude(amount=-CORTAR_EXTRUIR7_DEPTH, mode=Mode.SUBTRACT)

    # Croquis10 → Cortar-Extruir9 (cut, through all)
    with BuildSketch(Plane.XY.offset(3.5)):
        with BuildLine():
            Line((-19.1, 15.5), (-4.1, 15.5))
            ThreePointArc((-4.1, 15.5), (-1.6, 13), (-4.1, 10.5))
            Line((-4.1, 10.5), (-19.1, 10.5))
            ThreePointArc((-19.1, 10.5), (-21.6, 13), (-19.1, 15.5))
        make_face()
        with BuildLine():
            Line((19.1, 15.5), (4.1, 15.5))
            ThreePointArc((4.1, 15.5), (1.6, 13), (4.1, 10.5))
            Line((4.1, 10.5), (19.1, 10.5))
            ThreePointArc((19.1, 10.5), (21.6, 13), (19.1, 15.5))
        make_face()
    extrude(amount=-CORTAR_EXTRUIR9_DEPTH, mode=Mode.SUBTRACT)


solid = part.part
